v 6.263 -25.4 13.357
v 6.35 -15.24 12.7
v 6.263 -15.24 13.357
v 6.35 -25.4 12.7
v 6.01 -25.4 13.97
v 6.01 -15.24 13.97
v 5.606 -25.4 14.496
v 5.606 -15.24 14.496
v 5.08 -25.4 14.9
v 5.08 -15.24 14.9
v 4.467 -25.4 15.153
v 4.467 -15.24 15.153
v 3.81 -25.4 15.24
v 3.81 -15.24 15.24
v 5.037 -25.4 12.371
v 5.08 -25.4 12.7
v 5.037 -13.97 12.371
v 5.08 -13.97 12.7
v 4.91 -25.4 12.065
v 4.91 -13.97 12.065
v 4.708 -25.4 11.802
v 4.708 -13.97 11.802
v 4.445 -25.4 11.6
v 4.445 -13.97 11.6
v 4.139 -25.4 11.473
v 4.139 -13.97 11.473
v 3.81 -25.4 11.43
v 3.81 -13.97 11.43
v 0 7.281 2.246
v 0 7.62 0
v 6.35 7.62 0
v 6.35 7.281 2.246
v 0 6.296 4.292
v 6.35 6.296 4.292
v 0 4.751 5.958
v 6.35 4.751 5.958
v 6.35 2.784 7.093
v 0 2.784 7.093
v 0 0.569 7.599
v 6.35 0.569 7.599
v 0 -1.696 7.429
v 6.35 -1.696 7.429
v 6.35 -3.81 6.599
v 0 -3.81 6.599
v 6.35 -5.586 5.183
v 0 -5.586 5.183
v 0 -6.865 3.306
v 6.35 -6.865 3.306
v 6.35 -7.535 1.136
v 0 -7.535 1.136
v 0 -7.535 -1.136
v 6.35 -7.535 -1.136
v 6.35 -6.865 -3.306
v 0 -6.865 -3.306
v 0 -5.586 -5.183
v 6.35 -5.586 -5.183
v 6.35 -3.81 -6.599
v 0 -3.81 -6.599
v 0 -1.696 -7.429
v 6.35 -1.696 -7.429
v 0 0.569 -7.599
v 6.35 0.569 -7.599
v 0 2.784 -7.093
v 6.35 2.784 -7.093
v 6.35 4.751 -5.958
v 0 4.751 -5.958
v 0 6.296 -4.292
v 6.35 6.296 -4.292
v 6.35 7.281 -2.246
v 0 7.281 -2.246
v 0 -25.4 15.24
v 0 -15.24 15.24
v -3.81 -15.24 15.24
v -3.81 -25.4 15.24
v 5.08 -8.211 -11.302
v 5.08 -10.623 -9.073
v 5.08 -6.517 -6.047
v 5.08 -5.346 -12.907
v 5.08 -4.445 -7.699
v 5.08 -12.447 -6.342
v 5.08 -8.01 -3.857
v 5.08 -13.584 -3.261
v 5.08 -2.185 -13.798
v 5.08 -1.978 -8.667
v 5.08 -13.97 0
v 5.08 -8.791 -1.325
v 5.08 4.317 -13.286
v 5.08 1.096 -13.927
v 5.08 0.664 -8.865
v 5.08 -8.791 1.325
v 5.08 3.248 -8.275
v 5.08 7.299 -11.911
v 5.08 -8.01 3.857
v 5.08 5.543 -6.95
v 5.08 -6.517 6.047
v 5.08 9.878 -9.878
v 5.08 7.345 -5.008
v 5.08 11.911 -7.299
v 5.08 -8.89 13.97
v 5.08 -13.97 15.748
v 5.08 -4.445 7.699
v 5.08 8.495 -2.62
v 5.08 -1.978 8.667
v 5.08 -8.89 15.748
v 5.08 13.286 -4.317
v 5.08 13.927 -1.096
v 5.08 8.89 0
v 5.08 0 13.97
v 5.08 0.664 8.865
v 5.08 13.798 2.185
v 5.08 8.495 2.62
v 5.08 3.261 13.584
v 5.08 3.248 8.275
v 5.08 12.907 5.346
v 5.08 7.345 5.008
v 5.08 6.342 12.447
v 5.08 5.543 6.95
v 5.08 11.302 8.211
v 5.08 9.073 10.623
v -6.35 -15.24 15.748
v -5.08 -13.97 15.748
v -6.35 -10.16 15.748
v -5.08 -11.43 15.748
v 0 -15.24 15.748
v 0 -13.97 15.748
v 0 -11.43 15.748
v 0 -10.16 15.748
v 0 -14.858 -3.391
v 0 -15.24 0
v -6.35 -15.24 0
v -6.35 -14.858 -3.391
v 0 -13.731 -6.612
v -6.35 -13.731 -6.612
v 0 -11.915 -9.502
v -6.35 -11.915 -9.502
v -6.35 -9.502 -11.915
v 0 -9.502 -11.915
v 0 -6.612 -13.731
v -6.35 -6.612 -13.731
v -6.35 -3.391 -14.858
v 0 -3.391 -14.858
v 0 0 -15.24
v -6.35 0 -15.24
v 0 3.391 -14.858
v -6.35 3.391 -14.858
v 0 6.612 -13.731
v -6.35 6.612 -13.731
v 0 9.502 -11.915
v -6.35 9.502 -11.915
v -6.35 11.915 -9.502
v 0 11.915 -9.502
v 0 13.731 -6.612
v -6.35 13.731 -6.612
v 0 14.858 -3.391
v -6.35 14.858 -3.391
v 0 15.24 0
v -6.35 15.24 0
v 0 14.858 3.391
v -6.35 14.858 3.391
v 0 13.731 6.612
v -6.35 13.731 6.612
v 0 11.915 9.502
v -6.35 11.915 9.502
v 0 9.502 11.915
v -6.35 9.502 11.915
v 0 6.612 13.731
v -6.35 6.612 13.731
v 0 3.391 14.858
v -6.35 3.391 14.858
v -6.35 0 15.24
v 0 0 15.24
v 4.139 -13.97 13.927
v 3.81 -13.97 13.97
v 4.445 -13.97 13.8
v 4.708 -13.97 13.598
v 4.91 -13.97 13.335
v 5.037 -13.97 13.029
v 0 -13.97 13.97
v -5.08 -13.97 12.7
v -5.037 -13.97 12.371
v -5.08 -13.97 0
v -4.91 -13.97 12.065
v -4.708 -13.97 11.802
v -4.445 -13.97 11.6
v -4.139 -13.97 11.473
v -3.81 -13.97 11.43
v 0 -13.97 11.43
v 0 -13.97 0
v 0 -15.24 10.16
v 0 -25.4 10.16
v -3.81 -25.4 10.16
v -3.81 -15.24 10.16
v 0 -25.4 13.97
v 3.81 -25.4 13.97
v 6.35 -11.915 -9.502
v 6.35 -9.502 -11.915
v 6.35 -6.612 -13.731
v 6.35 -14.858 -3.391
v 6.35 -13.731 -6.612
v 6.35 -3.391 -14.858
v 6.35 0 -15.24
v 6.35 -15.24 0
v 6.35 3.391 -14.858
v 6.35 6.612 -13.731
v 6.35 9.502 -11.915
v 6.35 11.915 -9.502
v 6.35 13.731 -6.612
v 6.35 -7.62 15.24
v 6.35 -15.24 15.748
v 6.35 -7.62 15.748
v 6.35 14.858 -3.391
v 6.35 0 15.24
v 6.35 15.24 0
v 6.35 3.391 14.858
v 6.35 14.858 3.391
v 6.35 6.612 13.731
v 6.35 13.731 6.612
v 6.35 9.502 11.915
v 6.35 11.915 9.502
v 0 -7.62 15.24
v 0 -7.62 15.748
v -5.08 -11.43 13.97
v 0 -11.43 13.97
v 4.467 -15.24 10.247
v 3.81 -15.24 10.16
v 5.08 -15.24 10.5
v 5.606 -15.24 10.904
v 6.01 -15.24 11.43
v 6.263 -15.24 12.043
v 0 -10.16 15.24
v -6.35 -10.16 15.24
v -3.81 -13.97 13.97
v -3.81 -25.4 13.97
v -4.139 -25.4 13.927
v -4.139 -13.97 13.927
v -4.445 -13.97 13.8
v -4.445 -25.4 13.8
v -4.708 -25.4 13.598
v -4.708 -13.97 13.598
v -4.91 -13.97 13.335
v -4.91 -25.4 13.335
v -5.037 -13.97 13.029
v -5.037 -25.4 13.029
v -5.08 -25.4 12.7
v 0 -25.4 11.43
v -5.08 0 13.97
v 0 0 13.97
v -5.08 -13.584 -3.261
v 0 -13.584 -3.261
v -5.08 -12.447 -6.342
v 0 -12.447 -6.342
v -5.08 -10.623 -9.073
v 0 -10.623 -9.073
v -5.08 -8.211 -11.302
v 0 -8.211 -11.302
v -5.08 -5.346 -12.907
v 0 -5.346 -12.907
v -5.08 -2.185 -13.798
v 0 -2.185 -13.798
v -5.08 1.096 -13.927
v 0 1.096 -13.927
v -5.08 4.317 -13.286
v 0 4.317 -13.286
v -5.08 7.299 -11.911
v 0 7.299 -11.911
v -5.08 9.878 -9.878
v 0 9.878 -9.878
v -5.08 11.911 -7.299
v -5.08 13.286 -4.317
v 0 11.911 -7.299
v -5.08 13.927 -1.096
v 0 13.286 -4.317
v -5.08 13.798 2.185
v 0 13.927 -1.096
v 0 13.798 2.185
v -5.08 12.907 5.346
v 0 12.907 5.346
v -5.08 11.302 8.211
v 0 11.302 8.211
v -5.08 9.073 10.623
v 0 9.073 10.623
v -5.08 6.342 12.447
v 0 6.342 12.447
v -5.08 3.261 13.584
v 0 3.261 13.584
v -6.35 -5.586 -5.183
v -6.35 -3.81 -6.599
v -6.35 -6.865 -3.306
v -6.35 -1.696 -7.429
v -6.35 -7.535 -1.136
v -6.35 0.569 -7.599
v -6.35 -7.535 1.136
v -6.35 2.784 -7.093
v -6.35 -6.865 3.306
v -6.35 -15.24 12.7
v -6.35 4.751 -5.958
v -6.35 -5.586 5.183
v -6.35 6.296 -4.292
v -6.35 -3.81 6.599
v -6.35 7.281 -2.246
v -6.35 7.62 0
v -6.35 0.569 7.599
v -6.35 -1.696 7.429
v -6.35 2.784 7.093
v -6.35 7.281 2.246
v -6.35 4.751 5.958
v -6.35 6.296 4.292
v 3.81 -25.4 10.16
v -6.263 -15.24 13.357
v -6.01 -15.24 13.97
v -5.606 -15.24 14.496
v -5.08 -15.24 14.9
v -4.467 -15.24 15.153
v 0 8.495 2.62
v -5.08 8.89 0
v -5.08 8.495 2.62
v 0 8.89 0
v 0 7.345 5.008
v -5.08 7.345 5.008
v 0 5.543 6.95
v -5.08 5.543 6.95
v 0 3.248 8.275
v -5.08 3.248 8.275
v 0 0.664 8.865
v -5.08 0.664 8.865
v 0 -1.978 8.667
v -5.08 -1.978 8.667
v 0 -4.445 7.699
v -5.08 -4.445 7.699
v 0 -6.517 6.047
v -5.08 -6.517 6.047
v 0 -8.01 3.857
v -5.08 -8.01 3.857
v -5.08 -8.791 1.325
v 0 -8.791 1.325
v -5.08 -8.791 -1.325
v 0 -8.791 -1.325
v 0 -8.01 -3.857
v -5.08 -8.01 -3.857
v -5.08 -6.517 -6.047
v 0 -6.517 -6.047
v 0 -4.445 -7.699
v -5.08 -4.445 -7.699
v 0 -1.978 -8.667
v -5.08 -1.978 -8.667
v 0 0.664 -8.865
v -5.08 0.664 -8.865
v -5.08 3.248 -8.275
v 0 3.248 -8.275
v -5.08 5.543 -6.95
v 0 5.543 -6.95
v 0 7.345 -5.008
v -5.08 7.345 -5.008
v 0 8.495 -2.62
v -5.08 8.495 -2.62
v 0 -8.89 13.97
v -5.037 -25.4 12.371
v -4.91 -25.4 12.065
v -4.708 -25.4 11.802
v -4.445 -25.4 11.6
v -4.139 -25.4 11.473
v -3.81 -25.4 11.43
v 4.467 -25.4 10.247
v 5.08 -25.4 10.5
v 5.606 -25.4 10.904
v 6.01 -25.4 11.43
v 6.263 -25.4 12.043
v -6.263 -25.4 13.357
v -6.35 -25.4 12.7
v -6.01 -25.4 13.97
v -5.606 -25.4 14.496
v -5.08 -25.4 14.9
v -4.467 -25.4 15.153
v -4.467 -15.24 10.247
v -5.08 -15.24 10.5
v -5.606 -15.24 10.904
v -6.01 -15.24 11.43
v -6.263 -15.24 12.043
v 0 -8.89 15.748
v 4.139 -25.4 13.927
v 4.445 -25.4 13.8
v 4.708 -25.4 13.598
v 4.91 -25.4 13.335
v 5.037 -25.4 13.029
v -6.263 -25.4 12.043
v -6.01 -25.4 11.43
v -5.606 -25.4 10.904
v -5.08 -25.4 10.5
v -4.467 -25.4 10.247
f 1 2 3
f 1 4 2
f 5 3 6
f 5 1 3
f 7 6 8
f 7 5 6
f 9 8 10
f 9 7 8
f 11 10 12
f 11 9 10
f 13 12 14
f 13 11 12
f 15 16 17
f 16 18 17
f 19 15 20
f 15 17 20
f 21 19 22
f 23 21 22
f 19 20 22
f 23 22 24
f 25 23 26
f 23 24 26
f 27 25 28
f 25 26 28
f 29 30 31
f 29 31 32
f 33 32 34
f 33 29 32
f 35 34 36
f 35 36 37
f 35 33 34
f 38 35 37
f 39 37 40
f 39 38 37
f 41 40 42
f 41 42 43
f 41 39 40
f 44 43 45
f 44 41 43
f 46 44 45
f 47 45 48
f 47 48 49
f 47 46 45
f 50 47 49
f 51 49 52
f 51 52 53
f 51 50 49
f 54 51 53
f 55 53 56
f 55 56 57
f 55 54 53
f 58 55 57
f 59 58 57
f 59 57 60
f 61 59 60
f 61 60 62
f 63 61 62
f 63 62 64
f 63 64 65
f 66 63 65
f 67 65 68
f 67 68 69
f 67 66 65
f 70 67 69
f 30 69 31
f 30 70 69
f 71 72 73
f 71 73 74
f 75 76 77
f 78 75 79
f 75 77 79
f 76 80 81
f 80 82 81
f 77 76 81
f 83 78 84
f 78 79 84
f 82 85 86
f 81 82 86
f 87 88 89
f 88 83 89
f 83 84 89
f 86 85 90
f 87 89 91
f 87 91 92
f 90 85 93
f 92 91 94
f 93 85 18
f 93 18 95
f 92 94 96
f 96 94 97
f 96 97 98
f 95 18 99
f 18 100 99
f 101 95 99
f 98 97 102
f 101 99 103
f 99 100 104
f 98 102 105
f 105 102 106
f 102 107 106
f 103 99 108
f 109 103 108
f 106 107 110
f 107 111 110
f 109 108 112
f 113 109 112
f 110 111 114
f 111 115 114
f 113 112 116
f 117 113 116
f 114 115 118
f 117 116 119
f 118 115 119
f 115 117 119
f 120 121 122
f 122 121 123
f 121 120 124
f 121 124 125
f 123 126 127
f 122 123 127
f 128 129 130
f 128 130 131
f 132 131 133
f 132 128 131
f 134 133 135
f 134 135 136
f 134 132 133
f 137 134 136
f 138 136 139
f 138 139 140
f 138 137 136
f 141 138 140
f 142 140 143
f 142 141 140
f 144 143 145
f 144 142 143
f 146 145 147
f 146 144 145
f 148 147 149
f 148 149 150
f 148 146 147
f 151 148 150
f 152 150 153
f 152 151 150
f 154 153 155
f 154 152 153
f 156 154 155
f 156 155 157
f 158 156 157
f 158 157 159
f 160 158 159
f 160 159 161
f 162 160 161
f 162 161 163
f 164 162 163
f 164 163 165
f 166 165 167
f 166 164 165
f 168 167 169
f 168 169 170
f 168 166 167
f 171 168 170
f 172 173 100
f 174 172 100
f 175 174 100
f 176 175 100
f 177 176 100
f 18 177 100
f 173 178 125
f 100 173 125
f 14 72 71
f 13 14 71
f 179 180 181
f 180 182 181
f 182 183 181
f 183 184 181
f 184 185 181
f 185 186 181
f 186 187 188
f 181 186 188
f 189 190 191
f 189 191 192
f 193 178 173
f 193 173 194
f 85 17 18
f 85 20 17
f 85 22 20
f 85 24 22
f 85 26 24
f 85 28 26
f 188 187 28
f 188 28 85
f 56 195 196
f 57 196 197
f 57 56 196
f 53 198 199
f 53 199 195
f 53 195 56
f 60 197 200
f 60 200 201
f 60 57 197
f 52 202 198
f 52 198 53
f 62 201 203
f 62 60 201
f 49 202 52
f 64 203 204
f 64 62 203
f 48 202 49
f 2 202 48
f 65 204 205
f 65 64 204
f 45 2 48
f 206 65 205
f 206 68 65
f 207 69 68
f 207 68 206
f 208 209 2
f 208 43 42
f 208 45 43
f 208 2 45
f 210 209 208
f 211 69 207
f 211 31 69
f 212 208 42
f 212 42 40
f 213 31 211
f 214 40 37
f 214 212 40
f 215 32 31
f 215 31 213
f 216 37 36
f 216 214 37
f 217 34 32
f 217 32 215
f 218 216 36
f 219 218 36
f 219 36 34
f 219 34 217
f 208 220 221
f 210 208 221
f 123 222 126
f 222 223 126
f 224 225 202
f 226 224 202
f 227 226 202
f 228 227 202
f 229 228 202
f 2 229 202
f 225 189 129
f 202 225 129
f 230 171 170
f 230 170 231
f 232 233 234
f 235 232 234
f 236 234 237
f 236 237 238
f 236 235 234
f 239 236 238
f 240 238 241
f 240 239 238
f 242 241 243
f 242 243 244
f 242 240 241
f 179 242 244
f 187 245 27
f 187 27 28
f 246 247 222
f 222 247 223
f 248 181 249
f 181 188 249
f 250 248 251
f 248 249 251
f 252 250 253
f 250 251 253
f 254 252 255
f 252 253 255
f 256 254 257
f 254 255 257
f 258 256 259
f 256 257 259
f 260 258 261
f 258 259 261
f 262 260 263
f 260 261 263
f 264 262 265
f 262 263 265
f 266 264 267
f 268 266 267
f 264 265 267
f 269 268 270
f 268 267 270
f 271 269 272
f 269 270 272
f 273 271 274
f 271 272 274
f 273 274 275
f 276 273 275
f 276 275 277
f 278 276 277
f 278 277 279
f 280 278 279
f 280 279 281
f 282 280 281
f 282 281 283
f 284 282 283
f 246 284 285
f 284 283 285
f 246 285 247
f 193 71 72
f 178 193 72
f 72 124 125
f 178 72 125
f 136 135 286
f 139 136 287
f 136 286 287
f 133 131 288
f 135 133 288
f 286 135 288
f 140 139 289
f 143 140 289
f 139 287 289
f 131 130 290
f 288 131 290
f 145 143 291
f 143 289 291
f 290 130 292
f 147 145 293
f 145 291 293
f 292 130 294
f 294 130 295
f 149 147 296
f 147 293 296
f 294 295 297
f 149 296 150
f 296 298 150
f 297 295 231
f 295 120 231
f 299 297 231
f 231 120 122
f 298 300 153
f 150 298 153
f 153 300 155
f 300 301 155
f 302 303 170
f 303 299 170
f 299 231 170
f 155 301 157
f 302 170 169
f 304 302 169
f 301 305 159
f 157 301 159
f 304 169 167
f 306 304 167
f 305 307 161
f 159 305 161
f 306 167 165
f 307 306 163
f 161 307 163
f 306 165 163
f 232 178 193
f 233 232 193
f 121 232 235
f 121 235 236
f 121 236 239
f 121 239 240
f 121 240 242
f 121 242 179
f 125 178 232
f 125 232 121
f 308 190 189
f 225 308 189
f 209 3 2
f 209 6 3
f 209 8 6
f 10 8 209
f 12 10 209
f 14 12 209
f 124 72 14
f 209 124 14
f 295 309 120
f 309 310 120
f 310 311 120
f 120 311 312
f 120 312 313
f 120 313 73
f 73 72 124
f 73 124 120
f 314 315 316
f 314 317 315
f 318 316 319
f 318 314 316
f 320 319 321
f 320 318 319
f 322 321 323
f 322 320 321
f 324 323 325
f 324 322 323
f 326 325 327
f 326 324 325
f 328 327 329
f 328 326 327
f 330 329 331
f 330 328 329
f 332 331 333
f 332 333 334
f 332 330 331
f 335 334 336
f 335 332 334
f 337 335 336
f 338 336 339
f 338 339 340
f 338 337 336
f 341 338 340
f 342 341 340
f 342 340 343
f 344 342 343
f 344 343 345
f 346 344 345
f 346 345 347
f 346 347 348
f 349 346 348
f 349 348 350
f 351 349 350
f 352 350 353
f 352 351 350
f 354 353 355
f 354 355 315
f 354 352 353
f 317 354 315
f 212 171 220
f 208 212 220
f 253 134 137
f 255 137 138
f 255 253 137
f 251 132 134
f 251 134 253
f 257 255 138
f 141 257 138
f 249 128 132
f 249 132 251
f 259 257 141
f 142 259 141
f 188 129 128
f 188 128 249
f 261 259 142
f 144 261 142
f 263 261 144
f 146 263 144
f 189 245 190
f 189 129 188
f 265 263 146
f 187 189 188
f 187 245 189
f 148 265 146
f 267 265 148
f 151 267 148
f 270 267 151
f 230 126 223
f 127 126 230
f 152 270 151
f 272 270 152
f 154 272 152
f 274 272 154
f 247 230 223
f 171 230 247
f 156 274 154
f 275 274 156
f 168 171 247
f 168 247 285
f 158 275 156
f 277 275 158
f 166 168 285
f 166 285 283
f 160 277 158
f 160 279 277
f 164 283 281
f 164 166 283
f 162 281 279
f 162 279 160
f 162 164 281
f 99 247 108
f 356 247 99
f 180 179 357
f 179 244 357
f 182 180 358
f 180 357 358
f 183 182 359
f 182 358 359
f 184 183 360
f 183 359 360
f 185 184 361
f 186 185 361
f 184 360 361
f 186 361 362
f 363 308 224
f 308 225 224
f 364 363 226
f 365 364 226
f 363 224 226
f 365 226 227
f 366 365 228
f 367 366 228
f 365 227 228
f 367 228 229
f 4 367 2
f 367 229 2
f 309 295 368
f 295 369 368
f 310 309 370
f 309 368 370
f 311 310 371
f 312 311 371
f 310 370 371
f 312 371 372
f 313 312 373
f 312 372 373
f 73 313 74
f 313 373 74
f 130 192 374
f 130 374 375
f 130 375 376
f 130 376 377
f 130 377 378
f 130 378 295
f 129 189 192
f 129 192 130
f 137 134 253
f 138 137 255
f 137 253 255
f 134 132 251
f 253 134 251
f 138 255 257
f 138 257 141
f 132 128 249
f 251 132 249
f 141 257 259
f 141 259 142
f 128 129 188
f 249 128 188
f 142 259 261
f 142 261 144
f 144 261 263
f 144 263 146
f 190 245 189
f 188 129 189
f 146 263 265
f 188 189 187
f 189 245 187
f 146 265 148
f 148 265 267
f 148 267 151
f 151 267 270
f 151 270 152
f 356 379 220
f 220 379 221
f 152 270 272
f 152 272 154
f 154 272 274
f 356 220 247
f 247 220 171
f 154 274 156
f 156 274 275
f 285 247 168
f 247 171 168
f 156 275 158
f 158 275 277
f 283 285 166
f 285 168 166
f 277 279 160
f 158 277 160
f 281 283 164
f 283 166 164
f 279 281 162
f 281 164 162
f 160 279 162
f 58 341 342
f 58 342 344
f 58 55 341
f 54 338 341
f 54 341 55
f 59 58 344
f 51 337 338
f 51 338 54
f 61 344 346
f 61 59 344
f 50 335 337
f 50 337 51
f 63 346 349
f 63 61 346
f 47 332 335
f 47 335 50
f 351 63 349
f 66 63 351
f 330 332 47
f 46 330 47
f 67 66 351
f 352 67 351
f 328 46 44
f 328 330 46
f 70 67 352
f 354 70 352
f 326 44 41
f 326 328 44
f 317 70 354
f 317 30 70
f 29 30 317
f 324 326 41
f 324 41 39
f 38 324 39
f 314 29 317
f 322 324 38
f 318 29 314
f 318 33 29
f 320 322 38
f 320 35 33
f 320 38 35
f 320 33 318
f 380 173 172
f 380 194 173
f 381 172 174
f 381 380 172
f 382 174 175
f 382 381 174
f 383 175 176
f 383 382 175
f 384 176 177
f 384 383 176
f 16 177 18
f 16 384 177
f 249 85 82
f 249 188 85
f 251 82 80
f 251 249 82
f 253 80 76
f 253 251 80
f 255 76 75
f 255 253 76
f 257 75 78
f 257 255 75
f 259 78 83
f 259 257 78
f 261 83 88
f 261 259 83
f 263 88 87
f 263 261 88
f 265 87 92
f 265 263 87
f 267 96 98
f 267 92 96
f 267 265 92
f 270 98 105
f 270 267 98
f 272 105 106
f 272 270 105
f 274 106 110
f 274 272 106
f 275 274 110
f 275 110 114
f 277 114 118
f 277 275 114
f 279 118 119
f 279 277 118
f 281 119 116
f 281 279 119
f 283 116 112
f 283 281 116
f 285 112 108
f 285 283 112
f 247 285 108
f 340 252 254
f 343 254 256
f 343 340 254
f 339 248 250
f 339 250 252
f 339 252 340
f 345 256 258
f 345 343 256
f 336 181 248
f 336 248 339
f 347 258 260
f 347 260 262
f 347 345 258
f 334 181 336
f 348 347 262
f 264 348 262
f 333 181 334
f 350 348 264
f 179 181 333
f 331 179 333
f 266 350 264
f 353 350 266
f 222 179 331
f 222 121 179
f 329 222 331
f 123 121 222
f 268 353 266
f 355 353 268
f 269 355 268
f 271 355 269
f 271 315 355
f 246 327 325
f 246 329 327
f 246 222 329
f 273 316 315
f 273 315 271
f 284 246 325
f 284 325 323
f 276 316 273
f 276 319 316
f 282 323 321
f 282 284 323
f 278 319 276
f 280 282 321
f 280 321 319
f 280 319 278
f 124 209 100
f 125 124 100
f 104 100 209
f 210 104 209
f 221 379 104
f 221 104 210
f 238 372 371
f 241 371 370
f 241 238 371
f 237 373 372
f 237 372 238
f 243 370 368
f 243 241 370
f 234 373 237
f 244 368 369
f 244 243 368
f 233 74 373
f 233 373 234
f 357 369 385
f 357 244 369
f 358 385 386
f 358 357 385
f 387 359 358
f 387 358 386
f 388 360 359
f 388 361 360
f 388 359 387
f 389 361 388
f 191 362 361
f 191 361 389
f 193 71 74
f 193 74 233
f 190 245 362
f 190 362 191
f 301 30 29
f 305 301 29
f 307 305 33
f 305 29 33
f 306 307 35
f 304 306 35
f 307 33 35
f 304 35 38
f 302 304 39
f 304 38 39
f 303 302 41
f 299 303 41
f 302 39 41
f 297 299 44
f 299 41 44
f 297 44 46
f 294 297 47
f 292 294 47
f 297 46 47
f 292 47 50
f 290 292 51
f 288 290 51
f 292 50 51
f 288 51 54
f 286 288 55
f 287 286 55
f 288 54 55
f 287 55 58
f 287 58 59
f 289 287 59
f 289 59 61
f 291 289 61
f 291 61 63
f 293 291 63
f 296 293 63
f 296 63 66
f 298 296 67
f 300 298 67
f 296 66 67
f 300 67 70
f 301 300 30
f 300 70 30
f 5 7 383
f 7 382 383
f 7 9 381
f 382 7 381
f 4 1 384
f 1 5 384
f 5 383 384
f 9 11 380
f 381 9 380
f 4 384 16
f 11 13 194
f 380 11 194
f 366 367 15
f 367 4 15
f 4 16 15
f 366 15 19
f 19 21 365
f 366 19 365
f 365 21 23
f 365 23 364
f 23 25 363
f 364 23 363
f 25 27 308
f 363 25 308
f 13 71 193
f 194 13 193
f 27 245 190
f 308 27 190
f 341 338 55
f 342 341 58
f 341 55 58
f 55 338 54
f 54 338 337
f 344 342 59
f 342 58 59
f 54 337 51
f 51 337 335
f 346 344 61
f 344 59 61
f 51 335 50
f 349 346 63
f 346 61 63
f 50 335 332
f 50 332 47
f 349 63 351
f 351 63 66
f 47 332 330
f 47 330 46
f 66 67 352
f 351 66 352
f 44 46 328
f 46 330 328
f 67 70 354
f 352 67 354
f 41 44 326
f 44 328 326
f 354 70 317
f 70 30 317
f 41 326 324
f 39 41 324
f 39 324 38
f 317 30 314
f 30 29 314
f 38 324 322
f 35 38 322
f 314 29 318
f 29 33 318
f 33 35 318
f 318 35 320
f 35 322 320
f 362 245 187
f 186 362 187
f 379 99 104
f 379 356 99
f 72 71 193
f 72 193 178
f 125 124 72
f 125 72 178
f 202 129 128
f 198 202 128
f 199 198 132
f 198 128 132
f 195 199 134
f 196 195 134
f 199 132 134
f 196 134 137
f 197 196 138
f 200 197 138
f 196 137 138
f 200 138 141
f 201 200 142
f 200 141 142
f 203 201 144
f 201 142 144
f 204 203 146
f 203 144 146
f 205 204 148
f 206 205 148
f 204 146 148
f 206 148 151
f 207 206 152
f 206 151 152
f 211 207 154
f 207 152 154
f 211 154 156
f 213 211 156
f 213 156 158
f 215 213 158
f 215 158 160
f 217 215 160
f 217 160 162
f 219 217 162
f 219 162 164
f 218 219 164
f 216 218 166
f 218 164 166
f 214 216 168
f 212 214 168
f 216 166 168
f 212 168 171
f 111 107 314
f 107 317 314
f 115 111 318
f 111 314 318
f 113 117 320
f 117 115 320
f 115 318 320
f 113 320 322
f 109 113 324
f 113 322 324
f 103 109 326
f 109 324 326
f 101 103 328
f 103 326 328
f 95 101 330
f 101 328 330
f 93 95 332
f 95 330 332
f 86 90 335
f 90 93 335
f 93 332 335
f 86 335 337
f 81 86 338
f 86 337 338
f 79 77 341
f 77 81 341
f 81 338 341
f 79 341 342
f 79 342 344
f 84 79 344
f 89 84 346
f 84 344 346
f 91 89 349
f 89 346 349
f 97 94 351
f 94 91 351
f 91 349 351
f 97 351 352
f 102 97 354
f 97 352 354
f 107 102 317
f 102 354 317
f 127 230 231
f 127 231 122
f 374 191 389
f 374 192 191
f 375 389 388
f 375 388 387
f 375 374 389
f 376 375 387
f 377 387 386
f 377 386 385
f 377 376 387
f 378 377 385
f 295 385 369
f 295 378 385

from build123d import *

# Parameters (mm, degrees)
F0_R     = 7.62
F0_W     = 5.08
F0_H     = 0.508
F1_DEPTH = 6.35
F2_T     = -1.27
F3_R     = 7.62
F3_W     = 7.62
F3_H     = 0.508
F4_DEPTH = 6.35
F5_T     = -1.27
F6_R     = 2.53999
F6_2_R   = 2.53999
F7_R     = 1.26999
F7_2_R   = 1.26999


# Not quite as in the source:
# - a fillet or chamfer is up to 0.001 mm smaller than in the source, because OpenCascade refuses the exact size


with BuildPart() as f1:
    # F0 (on Right) → F1 (new body)
    with BuildSketch(Plane.YZ):
        with BuildLine():
            Line((-15.24, 15.24), (-25.4, 15.24))
            Line((-25.4, 15.24), (-25.4, 10.16))
            Line((-25.4, 10.16), (-15.24, 10.16))
            Line((-15.24, 10.16), (-15.24, 0))
            ThreePointArc((-15.24, 0), (10.7763073453, -10.7763073453), (0, 15.24))
            Line((0, 15.24), (-10.16, 15.24))
            Line((-10.16, 15.24), (-15.24, 15.24))
        make_face()
        Circle(F0_R, mode=Mode.SUBTRACT)
        with Locations((-12.7, 15.494)):
            Rectangle(F0_W, F0_H)
    extrude(amount=-F1_DEPTH)

    # F2
    f2_openings = [f1.faces().sort_by_distance(p)[0] for p in [
        (-3.175, -25.4, 12.7),
        (-3.175, -12.7, 15.748),
        (0, -5.08, 14.728936),
    ]]
    offset(amount=F2_T, openings=f2_openings, kind=Kind.INTERSECTION)

    # F6 (radius 2.54 in the source; OpenCascade refuses exactly that, so slightly less here)
    f6_edges = [f1.edges().sort_by_distance(p)[0] for p in [
        (-6.35, -20.32, 15.24),
        (-6.35, -20.32, 10.16),
    ]]
    fillet(f6_edges, radius=F6_R)

    # F7 (radius 1.27 in the source; OpenCascade refuses exactly that, so slightly less here)
    f7_edges = [f1.edges().sort_by_distance(p)[0] for p in [
        (-5.08, -19.685, 13.97),
        (-5.08, -19.685, 11.43),
    ]]
    fillet(f7_edges, radius=F7_R)


with BuildPart() as f4:
    # F3 (on Right) → F4 (new body)
    with BuildSketch(Plane.YZ):
        with BuildLine():
            Line((-15.24, 15.24), (-25.4, 15.24))
            Line((-25.4, 15.24), (-25.4, 10.16))
            Line((-25.4, 10.16), (-15.24, 10.16))
            Line((-15.24, 10.16), (-15.24, 0))
            ThreePointArc((-15.24, 0), (10.7763073453, -10.7763073453), (0, 15.24))
            Line((0, 15.24), (-7.62, 15.24))
            Line((-7.62, 15.24), (-15.24, 15.24))
        make_face()
        Circle(F3_R, mode=Mode.SUBTRACT)
        with Locations((-11.43, 15.494)):
            Rectangle(F3_W, F3_H)
    extrude(amount=F4_DEPTH)

    # F5
    f5_openings = [f4.faces().sort_by_distance(p)[0] for p in [
        (3.175, -25.4, 12.7),
        (3.175, -11.43, 15.748),
        (0, -3.81, 14.728936),
    ]]
    offset(amount=F5_T, openings=f5_openings, kind=Kind.INTERSECTION)

    # F6#2 (radius 2.54 in the source; OpenCascade refuses exactly that, so slightly less here)
    f6_2_edges = [f4.edges().sort_by_distance(p)[0] for p in [
        (6.35, -20.32, 15.24),
        (6.35, -20.32, 10.16),
    ]]
    fillet(f6_2_edges, radius=F6_2_R)

    # F7#2 (radius 1.27 in the source; OpenCascade refuses exactly that, so slightly less here)
    f7_2_edges = [f4.edges().sort_by_distance(p)[0] for p in [
        (5.08, -19.685, 11.43),
        (5.08, -19.685, 13.97),
    ]]
    fillet(f7_2_edges, radius=F7_2_R)


solid = Compound([f1.part, f4.part])
